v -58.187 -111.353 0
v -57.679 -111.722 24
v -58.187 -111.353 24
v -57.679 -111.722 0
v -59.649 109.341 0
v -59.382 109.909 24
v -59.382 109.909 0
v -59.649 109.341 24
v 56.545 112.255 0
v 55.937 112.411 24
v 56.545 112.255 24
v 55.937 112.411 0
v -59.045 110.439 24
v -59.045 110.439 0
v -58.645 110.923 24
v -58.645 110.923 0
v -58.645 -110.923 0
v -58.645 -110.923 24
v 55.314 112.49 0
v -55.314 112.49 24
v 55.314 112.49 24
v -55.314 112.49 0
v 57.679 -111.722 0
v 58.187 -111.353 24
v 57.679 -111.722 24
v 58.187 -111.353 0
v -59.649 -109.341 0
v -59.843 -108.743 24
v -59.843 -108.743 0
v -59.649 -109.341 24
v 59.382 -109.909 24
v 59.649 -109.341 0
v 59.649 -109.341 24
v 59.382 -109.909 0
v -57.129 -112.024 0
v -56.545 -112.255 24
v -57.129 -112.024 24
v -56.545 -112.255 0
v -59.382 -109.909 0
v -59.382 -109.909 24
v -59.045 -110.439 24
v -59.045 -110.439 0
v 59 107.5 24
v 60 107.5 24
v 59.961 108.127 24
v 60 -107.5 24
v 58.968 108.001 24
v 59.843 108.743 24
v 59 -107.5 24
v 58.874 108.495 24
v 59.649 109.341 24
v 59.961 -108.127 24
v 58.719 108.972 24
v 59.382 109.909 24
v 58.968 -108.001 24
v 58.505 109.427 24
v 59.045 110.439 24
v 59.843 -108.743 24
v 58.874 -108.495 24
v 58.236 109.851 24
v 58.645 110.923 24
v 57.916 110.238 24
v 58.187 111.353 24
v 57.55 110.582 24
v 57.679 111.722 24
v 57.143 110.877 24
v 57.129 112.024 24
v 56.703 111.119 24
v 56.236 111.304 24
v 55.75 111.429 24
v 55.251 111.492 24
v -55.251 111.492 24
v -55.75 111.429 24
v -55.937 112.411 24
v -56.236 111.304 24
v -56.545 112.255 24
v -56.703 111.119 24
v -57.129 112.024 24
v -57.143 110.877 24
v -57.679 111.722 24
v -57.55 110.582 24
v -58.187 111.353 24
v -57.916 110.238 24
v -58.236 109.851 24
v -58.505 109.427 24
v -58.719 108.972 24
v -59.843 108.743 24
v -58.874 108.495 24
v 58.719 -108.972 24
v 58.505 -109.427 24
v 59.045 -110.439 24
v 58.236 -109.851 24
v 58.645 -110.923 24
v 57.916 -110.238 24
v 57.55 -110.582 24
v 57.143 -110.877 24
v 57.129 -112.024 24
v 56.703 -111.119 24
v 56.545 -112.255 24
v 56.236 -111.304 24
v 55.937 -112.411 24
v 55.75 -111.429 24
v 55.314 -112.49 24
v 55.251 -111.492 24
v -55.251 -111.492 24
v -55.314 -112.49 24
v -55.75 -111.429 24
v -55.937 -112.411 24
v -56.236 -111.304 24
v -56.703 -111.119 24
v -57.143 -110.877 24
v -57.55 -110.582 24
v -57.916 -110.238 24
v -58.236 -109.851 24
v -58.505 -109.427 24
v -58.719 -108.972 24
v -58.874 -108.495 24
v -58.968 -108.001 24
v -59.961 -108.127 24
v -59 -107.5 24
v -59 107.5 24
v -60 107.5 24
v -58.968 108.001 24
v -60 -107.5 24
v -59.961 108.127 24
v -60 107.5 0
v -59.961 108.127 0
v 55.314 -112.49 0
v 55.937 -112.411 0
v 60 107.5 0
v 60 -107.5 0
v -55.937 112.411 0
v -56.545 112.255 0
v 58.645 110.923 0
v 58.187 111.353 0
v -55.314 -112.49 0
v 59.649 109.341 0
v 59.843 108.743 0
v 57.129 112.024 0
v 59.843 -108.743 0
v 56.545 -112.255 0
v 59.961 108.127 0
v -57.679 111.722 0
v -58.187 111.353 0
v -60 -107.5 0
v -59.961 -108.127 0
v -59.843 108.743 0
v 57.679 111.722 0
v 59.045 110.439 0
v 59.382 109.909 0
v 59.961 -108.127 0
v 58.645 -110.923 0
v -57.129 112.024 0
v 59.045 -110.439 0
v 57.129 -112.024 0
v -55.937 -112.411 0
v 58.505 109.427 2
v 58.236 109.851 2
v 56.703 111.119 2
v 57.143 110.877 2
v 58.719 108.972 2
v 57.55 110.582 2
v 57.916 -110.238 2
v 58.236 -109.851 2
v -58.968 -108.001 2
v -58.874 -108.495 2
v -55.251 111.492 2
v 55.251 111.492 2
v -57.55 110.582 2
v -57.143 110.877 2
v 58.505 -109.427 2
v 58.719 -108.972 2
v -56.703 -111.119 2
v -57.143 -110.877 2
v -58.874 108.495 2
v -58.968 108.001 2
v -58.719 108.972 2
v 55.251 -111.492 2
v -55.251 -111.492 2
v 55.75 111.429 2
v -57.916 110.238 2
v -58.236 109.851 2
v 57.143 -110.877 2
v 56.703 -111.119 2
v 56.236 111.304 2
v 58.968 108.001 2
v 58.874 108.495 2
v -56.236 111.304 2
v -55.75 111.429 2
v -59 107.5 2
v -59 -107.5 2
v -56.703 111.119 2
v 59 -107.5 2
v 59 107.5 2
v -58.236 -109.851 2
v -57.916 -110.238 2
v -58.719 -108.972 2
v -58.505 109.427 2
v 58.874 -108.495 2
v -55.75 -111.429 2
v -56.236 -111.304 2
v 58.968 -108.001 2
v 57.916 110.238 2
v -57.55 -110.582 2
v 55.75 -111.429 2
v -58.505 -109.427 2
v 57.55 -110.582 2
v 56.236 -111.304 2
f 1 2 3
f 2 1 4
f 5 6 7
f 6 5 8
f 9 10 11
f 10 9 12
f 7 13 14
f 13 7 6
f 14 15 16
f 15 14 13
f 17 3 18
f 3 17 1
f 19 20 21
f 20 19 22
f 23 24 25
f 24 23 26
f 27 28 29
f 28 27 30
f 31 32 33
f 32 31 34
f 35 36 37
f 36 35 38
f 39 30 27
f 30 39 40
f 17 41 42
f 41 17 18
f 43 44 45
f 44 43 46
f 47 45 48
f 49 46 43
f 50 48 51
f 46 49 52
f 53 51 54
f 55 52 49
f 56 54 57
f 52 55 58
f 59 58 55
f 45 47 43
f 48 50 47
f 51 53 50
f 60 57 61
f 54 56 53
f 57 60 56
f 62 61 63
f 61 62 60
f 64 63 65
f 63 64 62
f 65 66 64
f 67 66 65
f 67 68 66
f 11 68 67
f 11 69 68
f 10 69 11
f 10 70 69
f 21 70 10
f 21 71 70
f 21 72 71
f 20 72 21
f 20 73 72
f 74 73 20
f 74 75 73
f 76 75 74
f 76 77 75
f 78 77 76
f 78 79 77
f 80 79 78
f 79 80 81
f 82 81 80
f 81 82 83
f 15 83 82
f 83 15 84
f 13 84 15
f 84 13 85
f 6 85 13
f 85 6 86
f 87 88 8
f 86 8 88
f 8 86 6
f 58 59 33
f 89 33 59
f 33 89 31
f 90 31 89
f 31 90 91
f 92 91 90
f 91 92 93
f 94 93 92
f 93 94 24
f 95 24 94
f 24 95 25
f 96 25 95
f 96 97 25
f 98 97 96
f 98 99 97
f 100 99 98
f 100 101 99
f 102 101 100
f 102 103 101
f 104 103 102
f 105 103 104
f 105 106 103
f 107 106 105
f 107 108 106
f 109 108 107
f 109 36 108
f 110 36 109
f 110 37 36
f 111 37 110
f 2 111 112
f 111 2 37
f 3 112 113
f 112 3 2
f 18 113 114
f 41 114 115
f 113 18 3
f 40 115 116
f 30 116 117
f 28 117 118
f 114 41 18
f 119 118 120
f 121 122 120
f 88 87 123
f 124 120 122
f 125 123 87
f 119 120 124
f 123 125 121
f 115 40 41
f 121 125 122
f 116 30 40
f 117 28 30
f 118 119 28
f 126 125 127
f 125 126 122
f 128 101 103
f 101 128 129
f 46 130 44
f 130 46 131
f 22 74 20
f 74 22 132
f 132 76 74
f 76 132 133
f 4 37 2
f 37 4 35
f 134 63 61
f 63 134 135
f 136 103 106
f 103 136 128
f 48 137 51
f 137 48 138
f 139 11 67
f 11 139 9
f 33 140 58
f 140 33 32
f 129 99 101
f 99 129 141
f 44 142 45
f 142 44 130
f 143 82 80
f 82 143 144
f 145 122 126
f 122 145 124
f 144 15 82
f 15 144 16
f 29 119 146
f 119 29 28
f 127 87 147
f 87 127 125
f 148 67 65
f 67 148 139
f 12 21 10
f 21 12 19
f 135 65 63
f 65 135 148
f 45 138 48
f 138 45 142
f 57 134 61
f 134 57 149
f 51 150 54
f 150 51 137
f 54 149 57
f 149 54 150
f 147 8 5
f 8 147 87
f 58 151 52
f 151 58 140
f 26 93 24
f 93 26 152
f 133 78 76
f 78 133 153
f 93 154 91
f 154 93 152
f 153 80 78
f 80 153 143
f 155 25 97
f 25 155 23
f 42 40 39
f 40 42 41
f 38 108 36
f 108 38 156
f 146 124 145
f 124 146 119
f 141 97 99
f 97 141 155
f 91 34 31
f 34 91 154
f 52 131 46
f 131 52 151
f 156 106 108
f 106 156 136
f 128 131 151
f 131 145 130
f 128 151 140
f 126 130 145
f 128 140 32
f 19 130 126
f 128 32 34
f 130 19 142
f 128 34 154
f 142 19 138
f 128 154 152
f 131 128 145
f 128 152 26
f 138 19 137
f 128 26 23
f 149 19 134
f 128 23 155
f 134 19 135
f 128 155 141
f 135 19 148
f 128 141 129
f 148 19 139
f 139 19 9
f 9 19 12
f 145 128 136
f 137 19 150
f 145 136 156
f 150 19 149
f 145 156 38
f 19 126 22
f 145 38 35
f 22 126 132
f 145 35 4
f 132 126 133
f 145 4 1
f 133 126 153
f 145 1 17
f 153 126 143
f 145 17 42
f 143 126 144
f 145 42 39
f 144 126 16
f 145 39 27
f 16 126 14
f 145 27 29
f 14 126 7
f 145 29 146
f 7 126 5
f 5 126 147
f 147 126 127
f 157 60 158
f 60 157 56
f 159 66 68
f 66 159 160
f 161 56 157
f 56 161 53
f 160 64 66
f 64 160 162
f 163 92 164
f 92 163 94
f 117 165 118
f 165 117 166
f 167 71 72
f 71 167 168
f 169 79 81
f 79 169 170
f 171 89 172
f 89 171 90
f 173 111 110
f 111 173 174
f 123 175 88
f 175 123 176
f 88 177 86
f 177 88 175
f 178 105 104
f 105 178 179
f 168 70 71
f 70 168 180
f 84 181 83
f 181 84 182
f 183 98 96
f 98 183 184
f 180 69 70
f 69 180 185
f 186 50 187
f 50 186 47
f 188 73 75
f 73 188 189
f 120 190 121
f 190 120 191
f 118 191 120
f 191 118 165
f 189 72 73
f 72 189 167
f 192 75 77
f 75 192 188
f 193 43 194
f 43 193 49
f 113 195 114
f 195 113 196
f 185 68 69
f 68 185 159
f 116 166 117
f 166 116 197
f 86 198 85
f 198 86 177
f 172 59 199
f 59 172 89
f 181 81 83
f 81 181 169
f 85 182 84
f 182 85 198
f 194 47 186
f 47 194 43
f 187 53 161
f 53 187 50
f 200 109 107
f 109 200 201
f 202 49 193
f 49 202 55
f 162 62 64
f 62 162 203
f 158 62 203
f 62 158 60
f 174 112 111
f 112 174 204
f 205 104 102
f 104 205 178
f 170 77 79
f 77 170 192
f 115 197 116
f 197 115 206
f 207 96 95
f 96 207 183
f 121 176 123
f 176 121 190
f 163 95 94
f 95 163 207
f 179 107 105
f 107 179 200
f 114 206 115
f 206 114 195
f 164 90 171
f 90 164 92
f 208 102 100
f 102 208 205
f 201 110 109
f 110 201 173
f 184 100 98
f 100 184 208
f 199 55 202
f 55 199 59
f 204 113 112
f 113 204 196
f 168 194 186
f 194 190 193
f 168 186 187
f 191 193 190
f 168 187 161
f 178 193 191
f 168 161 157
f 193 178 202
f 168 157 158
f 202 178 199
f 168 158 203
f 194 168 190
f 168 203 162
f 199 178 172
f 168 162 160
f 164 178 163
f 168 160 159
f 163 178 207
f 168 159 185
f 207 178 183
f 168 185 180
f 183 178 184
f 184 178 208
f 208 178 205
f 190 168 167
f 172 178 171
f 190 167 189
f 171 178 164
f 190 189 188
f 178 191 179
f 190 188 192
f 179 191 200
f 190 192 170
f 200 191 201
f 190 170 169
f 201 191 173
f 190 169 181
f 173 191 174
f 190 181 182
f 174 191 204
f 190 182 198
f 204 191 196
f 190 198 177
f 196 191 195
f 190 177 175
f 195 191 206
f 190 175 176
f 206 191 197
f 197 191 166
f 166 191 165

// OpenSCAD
$fn = 50;


difference() {
	union() {
		hull() {
			translate(v = [-55.0000000000, 107.5000000000, 0]) {
				cylinder(h = 24, r = 5);
			}
			translate(v = [55.0000000000, 107.5000000000, 0]) {
				cylinder(h = 24, r = 5);
			}
			translate(v = [-55.0000000000, -107.5000000000, 0]) {
				cylinder(h = 24, r = 5);
			}
			translate(v = [55.0000000000, -107.5000000000, 0]) {
				cylinder(h = 24, r = 5);
			}
		}
	}
	union() {
		translate(v = [0, 0, 2]) {
			hull() {
				translate(v = [-55.0000000000, 107.5000000000, 0]) {
					cylinder(h = 22, r = 4);
				}
				translate(v = [55.0000000000, 107.5000000000, 0]) {
					cylinder(h = 22, r = 4);
				}
				translate(v = [-55.0000000000, -107.5000000000, 0]) {
					cylinder(h = 22, r = 4);
				}
				translate(v = [55.0000000000, -107.5000000000, 0]) {
					cylinder(h = 22, r = 4);
				}
			}
		}
	}
}
